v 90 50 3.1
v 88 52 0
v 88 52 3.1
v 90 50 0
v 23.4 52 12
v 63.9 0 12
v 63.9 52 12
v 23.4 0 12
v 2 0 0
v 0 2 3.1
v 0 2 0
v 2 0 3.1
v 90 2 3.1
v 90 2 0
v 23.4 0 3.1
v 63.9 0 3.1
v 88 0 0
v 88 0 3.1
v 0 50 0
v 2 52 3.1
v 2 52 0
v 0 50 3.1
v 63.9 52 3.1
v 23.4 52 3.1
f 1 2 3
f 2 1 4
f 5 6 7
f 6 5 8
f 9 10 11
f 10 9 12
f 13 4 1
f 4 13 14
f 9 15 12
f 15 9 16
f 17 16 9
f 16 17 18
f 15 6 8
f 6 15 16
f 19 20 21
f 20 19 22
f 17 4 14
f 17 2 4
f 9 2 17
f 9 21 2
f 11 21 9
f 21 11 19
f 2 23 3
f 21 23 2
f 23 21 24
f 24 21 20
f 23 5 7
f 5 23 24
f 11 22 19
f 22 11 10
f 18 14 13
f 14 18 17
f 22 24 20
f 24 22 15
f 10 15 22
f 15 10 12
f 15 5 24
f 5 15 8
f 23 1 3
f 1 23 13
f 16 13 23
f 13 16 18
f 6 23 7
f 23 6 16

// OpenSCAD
$fn = 32;

// ----------------------------------------------------------------------
// Stepped bar: centerstep, 90 x 52 x 12/3.1 mm
// ----------------------------------------------------------------------

// --- parameters (mm) ---
bar_l = 90;               // bar length, X
bar_w = 52;               // bar width, Y
plate_t = 12;             // thickness of the thick zone, Z
thin_t = 3.1;             // thickness of the thin zone
corner_c = 2;             // corner chamfer of the bar
step_cut = 8.9;           // material removed from the thin zone
thick_from = 23.4;        // start of the thick middle zone
thick_to = 63.9;          // end of the thick middle zone
depth_1 = 8.9;            // depth of cut 1 from the top face
depth_2 = 8.9;            // depth of cut 2 from the top face

profile = [[2, 0], [88, 0], [90, 2], [90, 50], [88, 52], [2, 52], [0, 50], [0, 2]];  // primary outline, 8 points, counter clockwise
void_1 = [[-1, -1], [23.4, -1], [23.4, 53], [-1, 53]];  // thin left end, 4 points
void_2 = [[63.9, -1], [91, -1], [91, 53], [63.9, 53]];  // thin right end, 4 points

// --- the one profile operation ---
difference() {
  linear_extrude(height = plate_t) polygon(points = profile);
  translate([0, 0, plate_t - depth_1])
    linear_extrude(height = depth_1 + 1) polygon(points = void_1);
  translate([0, 0, plate_t - depth_2])
    linear_extrude(height = depth_2 + 1) polygon(points = void_2);
}
